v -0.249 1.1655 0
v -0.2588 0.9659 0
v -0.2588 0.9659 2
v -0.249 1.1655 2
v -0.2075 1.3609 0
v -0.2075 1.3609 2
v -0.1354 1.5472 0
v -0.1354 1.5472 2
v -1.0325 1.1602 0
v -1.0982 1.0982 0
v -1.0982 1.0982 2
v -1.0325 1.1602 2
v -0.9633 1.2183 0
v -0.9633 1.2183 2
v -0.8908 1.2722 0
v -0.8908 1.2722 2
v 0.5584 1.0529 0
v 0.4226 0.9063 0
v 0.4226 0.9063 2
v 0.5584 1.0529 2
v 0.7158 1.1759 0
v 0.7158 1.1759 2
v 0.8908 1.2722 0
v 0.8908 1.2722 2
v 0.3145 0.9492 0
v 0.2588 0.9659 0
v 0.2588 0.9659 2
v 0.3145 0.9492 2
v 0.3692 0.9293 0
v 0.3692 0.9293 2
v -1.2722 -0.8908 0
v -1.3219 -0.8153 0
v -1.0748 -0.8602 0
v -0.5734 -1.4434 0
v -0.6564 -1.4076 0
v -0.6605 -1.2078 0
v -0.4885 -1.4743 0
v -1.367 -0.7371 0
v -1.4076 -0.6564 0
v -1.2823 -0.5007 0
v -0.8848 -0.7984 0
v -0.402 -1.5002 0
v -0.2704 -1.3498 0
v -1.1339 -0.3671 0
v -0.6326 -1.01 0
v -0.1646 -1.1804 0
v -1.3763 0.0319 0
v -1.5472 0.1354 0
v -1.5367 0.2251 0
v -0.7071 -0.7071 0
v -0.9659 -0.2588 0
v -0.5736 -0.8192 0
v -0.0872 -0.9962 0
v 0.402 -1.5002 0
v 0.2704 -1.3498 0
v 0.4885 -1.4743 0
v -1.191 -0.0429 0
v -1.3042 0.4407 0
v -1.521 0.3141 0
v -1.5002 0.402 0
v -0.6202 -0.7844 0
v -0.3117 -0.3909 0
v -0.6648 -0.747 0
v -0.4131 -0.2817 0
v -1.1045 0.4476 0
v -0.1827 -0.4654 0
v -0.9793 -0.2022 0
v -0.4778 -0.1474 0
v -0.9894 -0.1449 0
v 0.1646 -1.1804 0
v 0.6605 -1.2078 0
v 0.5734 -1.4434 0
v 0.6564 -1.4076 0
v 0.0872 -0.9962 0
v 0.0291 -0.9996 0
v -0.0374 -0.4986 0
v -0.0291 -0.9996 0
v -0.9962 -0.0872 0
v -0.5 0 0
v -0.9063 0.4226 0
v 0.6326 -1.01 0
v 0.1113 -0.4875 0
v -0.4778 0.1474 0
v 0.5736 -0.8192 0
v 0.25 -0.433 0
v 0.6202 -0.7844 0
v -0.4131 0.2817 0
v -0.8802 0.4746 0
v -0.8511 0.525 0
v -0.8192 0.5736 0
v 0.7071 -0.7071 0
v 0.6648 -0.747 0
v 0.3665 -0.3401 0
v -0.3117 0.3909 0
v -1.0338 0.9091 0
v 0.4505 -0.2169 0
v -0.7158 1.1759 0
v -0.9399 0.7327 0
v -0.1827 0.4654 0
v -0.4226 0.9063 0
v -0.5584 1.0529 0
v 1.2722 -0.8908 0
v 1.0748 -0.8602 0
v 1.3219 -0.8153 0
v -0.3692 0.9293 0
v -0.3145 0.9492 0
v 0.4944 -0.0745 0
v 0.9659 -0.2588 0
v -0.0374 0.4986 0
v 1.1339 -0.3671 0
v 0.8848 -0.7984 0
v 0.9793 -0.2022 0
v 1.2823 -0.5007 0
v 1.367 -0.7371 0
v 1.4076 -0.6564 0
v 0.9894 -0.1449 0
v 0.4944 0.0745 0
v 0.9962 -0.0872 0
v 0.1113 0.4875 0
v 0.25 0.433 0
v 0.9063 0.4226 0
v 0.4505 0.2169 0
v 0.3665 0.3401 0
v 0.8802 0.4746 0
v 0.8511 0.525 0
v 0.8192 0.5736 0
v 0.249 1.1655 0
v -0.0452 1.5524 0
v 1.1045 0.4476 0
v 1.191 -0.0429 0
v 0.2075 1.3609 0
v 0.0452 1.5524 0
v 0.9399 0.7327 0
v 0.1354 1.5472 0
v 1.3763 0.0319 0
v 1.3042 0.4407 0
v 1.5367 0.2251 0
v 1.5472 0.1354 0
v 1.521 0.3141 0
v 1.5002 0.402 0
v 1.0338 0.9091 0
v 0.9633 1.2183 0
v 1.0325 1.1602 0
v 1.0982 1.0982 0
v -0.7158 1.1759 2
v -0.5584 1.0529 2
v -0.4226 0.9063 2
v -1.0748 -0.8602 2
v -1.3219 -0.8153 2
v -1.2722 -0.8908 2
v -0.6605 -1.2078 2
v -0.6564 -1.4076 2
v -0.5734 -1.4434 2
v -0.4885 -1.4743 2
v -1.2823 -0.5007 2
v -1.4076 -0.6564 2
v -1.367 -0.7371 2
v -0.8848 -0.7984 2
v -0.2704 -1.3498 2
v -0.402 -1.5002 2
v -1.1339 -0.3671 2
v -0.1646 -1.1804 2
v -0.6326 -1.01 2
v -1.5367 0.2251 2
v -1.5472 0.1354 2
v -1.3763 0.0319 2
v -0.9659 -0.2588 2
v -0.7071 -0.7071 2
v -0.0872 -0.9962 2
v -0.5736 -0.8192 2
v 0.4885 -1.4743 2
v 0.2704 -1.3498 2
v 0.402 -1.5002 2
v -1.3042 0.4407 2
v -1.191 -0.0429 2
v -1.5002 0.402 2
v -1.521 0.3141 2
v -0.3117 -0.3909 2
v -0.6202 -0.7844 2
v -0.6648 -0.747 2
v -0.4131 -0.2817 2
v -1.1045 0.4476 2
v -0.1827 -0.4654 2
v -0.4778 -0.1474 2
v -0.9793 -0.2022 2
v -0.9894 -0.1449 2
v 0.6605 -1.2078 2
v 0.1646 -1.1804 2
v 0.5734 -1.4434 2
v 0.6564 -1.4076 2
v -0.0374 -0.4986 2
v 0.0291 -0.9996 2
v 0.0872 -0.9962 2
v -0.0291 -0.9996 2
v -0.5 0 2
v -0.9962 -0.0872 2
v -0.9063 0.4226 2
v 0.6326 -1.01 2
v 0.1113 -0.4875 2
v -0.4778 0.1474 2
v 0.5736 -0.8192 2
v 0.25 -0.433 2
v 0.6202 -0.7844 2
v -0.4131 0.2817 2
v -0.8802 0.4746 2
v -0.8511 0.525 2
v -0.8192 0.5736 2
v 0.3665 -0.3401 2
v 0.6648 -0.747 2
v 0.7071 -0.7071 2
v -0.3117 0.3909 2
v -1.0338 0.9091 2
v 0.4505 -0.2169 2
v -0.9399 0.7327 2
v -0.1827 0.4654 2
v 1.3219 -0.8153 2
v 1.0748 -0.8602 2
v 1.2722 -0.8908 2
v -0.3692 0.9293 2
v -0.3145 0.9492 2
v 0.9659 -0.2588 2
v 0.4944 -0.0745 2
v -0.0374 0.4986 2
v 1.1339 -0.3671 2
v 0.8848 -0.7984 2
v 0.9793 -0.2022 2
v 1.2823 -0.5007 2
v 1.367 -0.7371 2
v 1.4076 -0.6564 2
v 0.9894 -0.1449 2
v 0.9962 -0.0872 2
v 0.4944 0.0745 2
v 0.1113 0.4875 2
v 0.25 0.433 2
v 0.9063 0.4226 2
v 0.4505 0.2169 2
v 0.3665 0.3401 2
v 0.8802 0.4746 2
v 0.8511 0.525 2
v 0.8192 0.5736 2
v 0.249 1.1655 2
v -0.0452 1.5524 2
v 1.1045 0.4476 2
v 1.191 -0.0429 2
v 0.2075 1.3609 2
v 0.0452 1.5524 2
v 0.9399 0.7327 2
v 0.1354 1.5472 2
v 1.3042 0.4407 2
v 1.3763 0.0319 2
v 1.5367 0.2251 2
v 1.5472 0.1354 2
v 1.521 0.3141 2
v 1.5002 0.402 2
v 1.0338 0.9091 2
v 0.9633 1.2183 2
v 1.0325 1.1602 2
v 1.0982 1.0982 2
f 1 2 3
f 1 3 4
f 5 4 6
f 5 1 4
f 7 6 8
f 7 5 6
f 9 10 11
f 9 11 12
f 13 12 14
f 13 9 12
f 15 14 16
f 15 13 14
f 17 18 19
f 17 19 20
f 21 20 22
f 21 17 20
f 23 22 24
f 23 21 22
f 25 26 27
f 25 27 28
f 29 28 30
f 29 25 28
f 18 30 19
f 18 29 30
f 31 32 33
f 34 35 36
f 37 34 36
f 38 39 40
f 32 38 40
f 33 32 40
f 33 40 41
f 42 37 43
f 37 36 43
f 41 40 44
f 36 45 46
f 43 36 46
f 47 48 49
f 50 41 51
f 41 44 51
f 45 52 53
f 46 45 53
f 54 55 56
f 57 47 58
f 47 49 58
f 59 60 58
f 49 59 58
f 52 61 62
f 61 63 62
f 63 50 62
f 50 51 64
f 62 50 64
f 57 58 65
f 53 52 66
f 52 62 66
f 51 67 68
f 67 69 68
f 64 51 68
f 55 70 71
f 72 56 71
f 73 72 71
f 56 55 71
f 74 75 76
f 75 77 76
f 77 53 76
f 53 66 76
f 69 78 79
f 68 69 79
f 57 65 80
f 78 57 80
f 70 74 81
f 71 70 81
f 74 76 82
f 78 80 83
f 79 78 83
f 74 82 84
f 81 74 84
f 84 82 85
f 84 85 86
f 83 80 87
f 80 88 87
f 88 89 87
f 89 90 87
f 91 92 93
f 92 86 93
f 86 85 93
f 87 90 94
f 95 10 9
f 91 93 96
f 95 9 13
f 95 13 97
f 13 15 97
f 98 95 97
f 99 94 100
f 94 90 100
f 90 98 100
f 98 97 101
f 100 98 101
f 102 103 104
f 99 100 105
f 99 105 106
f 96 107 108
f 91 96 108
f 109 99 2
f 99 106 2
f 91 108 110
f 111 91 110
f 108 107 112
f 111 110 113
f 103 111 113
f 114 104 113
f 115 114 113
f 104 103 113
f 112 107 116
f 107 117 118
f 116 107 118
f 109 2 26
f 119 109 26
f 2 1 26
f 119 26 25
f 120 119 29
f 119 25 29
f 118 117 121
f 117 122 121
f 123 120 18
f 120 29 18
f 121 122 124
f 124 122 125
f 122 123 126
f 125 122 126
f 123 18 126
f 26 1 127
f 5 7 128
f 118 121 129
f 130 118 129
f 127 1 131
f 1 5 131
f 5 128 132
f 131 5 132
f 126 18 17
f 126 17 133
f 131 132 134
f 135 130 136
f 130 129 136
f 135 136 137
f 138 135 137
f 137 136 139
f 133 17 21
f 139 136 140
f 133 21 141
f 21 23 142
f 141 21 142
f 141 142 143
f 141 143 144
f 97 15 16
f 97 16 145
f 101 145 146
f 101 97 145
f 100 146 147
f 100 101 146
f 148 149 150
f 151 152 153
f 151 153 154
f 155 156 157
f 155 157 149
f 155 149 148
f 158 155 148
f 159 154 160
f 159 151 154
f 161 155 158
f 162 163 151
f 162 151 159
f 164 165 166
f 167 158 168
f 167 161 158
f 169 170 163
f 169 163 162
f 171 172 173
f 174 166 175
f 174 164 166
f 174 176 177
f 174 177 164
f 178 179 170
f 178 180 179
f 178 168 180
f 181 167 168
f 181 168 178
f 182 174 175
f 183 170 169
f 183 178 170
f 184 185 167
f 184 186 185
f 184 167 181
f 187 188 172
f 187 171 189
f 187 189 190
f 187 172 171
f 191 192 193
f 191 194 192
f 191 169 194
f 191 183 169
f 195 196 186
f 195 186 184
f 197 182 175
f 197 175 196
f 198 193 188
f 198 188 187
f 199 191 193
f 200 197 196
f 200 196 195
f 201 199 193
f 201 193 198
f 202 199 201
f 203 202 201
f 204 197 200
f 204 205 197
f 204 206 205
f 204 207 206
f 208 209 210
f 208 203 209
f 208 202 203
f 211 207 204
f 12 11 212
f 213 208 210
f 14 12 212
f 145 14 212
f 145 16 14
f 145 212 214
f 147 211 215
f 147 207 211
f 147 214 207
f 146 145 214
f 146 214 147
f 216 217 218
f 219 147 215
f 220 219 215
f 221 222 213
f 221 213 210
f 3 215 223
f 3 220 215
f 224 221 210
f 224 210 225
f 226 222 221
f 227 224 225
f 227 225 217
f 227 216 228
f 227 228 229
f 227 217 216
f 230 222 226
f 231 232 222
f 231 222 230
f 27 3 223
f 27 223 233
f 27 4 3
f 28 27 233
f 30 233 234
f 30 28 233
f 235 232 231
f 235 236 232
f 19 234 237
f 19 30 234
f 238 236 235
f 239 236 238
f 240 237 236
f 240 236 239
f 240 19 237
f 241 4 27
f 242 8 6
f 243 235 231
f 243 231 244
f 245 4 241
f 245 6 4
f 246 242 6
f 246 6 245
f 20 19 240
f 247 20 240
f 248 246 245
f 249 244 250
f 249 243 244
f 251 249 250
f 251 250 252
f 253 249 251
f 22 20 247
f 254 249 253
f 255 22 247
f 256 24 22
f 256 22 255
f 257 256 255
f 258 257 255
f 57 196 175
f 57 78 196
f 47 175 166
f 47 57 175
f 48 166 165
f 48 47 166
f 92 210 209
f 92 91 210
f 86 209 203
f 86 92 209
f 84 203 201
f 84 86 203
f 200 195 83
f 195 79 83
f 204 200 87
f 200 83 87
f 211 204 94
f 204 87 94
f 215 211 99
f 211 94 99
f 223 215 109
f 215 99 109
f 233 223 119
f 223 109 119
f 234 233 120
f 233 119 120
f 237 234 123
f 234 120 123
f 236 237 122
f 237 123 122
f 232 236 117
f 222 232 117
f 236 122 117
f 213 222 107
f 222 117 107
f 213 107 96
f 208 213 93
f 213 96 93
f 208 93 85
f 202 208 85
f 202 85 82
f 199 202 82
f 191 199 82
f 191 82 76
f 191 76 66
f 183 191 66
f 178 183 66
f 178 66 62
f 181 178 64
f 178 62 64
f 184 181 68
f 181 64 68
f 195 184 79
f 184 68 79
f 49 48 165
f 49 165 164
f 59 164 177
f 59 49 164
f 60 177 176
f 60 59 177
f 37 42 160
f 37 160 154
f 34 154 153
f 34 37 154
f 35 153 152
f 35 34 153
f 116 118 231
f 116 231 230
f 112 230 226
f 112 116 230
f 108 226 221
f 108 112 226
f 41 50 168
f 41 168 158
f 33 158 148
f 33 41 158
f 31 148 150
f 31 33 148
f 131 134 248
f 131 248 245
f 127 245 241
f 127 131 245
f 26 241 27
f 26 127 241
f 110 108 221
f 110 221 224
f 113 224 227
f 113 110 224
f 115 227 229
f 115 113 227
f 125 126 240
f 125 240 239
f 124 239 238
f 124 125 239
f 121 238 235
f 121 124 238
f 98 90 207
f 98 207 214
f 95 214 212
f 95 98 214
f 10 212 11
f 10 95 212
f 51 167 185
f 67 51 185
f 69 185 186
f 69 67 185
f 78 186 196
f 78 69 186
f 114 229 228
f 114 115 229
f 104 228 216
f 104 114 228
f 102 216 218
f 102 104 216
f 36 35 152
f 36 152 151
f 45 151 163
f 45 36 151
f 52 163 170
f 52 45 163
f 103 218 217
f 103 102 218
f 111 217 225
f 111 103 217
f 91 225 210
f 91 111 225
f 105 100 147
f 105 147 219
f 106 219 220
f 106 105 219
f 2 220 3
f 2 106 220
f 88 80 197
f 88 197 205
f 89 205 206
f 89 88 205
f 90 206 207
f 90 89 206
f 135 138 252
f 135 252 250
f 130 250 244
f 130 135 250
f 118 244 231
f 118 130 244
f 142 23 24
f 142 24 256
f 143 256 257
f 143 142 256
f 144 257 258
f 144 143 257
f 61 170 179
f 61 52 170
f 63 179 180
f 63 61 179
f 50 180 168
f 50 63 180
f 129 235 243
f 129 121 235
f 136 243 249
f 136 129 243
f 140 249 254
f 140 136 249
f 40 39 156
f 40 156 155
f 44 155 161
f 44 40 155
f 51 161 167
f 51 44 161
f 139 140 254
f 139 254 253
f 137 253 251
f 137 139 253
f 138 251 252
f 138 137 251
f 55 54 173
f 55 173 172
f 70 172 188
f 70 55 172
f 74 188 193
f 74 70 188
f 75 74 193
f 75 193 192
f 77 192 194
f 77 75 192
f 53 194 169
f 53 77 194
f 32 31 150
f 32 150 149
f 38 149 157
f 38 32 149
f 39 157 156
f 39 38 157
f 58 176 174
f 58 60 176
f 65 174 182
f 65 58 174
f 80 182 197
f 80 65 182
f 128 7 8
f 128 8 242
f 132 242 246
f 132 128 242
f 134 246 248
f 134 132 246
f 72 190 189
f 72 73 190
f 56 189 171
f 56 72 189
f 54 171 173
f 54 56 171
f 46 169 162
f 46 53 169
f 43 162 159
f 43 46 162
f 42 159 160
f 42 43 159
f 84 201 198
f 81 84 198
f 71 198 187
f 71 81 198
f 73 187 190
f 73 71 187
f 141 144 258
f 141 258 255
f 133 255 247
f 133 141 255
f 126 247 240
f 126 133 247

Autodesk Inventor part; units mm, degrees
sketch "Sketch1" plane through (0, 0, 0) normal (0, 0, 1) x (1, 0, 0)
  circle A0 centre (0, 0) radius 1.5531
  dimension "d0" = 3.1061
extrude "Extrusion1" add sketch "Sketch1" along normal blind 2
ref_plane "Work Plane2" through (0, 0, 1) normal (0, 0, 1) x (1, 0, 0)
sketch "Sketch2" plane through (0, 0, 0) normal (0, 0, -1) x (-1, 0, 0)
  circle A0 centre (0, 0) radius 1.5531 projected
  circle A1 centre (0, 0) radius 1.3795
  dimension "d3" = 2.759
surface extrude "Pitch Diameter" sketch "Sketch2" against normal through all shown no curves A1
ref_plane "Work Plane8" through (0, 0, 0) normal (0.9396926, 0.3420201, 0) x (0, 0, 1)
ref_plane "Work Plane9" through (0, 0, 0) normal (1, 0, 0) x (0, 1, 0)
spur gear teeth "Spur Gear" teeth 9 pitch diameter 2.8125 tip diameter 3.1062 root diameter 2 face width 2 start plane through (0, 0, 0) normal (0, 0, -1) x (-1, 0, 0)
sketch "Sketch3" plane through (0, 0, 0) normal (0, 0, -1) x (-1, 0, 0)
  circle A0 centre (0, 0) radius 0.5
  dimension "d49" = 1
extrude "Extrusion2" cut sketch "Sketch3" against normal through all
equation "\"d0\" = da_da"
equation "\"d1\" = da_b"
equation "\"d3\" = da_dw"
equation "\"d16\" = da_aw"
equation "\"d43\" = da_aw"
equation "\"d46\" = da_aw"
equation "\"da_da\" = 3.106154"
equation "\"da_b\" = 2"
equation "\"da_dw\" = 2.758973"
equation "\"da_aw\" = 6.284327"
properties part number "Spur Gear1" material "Steel"
